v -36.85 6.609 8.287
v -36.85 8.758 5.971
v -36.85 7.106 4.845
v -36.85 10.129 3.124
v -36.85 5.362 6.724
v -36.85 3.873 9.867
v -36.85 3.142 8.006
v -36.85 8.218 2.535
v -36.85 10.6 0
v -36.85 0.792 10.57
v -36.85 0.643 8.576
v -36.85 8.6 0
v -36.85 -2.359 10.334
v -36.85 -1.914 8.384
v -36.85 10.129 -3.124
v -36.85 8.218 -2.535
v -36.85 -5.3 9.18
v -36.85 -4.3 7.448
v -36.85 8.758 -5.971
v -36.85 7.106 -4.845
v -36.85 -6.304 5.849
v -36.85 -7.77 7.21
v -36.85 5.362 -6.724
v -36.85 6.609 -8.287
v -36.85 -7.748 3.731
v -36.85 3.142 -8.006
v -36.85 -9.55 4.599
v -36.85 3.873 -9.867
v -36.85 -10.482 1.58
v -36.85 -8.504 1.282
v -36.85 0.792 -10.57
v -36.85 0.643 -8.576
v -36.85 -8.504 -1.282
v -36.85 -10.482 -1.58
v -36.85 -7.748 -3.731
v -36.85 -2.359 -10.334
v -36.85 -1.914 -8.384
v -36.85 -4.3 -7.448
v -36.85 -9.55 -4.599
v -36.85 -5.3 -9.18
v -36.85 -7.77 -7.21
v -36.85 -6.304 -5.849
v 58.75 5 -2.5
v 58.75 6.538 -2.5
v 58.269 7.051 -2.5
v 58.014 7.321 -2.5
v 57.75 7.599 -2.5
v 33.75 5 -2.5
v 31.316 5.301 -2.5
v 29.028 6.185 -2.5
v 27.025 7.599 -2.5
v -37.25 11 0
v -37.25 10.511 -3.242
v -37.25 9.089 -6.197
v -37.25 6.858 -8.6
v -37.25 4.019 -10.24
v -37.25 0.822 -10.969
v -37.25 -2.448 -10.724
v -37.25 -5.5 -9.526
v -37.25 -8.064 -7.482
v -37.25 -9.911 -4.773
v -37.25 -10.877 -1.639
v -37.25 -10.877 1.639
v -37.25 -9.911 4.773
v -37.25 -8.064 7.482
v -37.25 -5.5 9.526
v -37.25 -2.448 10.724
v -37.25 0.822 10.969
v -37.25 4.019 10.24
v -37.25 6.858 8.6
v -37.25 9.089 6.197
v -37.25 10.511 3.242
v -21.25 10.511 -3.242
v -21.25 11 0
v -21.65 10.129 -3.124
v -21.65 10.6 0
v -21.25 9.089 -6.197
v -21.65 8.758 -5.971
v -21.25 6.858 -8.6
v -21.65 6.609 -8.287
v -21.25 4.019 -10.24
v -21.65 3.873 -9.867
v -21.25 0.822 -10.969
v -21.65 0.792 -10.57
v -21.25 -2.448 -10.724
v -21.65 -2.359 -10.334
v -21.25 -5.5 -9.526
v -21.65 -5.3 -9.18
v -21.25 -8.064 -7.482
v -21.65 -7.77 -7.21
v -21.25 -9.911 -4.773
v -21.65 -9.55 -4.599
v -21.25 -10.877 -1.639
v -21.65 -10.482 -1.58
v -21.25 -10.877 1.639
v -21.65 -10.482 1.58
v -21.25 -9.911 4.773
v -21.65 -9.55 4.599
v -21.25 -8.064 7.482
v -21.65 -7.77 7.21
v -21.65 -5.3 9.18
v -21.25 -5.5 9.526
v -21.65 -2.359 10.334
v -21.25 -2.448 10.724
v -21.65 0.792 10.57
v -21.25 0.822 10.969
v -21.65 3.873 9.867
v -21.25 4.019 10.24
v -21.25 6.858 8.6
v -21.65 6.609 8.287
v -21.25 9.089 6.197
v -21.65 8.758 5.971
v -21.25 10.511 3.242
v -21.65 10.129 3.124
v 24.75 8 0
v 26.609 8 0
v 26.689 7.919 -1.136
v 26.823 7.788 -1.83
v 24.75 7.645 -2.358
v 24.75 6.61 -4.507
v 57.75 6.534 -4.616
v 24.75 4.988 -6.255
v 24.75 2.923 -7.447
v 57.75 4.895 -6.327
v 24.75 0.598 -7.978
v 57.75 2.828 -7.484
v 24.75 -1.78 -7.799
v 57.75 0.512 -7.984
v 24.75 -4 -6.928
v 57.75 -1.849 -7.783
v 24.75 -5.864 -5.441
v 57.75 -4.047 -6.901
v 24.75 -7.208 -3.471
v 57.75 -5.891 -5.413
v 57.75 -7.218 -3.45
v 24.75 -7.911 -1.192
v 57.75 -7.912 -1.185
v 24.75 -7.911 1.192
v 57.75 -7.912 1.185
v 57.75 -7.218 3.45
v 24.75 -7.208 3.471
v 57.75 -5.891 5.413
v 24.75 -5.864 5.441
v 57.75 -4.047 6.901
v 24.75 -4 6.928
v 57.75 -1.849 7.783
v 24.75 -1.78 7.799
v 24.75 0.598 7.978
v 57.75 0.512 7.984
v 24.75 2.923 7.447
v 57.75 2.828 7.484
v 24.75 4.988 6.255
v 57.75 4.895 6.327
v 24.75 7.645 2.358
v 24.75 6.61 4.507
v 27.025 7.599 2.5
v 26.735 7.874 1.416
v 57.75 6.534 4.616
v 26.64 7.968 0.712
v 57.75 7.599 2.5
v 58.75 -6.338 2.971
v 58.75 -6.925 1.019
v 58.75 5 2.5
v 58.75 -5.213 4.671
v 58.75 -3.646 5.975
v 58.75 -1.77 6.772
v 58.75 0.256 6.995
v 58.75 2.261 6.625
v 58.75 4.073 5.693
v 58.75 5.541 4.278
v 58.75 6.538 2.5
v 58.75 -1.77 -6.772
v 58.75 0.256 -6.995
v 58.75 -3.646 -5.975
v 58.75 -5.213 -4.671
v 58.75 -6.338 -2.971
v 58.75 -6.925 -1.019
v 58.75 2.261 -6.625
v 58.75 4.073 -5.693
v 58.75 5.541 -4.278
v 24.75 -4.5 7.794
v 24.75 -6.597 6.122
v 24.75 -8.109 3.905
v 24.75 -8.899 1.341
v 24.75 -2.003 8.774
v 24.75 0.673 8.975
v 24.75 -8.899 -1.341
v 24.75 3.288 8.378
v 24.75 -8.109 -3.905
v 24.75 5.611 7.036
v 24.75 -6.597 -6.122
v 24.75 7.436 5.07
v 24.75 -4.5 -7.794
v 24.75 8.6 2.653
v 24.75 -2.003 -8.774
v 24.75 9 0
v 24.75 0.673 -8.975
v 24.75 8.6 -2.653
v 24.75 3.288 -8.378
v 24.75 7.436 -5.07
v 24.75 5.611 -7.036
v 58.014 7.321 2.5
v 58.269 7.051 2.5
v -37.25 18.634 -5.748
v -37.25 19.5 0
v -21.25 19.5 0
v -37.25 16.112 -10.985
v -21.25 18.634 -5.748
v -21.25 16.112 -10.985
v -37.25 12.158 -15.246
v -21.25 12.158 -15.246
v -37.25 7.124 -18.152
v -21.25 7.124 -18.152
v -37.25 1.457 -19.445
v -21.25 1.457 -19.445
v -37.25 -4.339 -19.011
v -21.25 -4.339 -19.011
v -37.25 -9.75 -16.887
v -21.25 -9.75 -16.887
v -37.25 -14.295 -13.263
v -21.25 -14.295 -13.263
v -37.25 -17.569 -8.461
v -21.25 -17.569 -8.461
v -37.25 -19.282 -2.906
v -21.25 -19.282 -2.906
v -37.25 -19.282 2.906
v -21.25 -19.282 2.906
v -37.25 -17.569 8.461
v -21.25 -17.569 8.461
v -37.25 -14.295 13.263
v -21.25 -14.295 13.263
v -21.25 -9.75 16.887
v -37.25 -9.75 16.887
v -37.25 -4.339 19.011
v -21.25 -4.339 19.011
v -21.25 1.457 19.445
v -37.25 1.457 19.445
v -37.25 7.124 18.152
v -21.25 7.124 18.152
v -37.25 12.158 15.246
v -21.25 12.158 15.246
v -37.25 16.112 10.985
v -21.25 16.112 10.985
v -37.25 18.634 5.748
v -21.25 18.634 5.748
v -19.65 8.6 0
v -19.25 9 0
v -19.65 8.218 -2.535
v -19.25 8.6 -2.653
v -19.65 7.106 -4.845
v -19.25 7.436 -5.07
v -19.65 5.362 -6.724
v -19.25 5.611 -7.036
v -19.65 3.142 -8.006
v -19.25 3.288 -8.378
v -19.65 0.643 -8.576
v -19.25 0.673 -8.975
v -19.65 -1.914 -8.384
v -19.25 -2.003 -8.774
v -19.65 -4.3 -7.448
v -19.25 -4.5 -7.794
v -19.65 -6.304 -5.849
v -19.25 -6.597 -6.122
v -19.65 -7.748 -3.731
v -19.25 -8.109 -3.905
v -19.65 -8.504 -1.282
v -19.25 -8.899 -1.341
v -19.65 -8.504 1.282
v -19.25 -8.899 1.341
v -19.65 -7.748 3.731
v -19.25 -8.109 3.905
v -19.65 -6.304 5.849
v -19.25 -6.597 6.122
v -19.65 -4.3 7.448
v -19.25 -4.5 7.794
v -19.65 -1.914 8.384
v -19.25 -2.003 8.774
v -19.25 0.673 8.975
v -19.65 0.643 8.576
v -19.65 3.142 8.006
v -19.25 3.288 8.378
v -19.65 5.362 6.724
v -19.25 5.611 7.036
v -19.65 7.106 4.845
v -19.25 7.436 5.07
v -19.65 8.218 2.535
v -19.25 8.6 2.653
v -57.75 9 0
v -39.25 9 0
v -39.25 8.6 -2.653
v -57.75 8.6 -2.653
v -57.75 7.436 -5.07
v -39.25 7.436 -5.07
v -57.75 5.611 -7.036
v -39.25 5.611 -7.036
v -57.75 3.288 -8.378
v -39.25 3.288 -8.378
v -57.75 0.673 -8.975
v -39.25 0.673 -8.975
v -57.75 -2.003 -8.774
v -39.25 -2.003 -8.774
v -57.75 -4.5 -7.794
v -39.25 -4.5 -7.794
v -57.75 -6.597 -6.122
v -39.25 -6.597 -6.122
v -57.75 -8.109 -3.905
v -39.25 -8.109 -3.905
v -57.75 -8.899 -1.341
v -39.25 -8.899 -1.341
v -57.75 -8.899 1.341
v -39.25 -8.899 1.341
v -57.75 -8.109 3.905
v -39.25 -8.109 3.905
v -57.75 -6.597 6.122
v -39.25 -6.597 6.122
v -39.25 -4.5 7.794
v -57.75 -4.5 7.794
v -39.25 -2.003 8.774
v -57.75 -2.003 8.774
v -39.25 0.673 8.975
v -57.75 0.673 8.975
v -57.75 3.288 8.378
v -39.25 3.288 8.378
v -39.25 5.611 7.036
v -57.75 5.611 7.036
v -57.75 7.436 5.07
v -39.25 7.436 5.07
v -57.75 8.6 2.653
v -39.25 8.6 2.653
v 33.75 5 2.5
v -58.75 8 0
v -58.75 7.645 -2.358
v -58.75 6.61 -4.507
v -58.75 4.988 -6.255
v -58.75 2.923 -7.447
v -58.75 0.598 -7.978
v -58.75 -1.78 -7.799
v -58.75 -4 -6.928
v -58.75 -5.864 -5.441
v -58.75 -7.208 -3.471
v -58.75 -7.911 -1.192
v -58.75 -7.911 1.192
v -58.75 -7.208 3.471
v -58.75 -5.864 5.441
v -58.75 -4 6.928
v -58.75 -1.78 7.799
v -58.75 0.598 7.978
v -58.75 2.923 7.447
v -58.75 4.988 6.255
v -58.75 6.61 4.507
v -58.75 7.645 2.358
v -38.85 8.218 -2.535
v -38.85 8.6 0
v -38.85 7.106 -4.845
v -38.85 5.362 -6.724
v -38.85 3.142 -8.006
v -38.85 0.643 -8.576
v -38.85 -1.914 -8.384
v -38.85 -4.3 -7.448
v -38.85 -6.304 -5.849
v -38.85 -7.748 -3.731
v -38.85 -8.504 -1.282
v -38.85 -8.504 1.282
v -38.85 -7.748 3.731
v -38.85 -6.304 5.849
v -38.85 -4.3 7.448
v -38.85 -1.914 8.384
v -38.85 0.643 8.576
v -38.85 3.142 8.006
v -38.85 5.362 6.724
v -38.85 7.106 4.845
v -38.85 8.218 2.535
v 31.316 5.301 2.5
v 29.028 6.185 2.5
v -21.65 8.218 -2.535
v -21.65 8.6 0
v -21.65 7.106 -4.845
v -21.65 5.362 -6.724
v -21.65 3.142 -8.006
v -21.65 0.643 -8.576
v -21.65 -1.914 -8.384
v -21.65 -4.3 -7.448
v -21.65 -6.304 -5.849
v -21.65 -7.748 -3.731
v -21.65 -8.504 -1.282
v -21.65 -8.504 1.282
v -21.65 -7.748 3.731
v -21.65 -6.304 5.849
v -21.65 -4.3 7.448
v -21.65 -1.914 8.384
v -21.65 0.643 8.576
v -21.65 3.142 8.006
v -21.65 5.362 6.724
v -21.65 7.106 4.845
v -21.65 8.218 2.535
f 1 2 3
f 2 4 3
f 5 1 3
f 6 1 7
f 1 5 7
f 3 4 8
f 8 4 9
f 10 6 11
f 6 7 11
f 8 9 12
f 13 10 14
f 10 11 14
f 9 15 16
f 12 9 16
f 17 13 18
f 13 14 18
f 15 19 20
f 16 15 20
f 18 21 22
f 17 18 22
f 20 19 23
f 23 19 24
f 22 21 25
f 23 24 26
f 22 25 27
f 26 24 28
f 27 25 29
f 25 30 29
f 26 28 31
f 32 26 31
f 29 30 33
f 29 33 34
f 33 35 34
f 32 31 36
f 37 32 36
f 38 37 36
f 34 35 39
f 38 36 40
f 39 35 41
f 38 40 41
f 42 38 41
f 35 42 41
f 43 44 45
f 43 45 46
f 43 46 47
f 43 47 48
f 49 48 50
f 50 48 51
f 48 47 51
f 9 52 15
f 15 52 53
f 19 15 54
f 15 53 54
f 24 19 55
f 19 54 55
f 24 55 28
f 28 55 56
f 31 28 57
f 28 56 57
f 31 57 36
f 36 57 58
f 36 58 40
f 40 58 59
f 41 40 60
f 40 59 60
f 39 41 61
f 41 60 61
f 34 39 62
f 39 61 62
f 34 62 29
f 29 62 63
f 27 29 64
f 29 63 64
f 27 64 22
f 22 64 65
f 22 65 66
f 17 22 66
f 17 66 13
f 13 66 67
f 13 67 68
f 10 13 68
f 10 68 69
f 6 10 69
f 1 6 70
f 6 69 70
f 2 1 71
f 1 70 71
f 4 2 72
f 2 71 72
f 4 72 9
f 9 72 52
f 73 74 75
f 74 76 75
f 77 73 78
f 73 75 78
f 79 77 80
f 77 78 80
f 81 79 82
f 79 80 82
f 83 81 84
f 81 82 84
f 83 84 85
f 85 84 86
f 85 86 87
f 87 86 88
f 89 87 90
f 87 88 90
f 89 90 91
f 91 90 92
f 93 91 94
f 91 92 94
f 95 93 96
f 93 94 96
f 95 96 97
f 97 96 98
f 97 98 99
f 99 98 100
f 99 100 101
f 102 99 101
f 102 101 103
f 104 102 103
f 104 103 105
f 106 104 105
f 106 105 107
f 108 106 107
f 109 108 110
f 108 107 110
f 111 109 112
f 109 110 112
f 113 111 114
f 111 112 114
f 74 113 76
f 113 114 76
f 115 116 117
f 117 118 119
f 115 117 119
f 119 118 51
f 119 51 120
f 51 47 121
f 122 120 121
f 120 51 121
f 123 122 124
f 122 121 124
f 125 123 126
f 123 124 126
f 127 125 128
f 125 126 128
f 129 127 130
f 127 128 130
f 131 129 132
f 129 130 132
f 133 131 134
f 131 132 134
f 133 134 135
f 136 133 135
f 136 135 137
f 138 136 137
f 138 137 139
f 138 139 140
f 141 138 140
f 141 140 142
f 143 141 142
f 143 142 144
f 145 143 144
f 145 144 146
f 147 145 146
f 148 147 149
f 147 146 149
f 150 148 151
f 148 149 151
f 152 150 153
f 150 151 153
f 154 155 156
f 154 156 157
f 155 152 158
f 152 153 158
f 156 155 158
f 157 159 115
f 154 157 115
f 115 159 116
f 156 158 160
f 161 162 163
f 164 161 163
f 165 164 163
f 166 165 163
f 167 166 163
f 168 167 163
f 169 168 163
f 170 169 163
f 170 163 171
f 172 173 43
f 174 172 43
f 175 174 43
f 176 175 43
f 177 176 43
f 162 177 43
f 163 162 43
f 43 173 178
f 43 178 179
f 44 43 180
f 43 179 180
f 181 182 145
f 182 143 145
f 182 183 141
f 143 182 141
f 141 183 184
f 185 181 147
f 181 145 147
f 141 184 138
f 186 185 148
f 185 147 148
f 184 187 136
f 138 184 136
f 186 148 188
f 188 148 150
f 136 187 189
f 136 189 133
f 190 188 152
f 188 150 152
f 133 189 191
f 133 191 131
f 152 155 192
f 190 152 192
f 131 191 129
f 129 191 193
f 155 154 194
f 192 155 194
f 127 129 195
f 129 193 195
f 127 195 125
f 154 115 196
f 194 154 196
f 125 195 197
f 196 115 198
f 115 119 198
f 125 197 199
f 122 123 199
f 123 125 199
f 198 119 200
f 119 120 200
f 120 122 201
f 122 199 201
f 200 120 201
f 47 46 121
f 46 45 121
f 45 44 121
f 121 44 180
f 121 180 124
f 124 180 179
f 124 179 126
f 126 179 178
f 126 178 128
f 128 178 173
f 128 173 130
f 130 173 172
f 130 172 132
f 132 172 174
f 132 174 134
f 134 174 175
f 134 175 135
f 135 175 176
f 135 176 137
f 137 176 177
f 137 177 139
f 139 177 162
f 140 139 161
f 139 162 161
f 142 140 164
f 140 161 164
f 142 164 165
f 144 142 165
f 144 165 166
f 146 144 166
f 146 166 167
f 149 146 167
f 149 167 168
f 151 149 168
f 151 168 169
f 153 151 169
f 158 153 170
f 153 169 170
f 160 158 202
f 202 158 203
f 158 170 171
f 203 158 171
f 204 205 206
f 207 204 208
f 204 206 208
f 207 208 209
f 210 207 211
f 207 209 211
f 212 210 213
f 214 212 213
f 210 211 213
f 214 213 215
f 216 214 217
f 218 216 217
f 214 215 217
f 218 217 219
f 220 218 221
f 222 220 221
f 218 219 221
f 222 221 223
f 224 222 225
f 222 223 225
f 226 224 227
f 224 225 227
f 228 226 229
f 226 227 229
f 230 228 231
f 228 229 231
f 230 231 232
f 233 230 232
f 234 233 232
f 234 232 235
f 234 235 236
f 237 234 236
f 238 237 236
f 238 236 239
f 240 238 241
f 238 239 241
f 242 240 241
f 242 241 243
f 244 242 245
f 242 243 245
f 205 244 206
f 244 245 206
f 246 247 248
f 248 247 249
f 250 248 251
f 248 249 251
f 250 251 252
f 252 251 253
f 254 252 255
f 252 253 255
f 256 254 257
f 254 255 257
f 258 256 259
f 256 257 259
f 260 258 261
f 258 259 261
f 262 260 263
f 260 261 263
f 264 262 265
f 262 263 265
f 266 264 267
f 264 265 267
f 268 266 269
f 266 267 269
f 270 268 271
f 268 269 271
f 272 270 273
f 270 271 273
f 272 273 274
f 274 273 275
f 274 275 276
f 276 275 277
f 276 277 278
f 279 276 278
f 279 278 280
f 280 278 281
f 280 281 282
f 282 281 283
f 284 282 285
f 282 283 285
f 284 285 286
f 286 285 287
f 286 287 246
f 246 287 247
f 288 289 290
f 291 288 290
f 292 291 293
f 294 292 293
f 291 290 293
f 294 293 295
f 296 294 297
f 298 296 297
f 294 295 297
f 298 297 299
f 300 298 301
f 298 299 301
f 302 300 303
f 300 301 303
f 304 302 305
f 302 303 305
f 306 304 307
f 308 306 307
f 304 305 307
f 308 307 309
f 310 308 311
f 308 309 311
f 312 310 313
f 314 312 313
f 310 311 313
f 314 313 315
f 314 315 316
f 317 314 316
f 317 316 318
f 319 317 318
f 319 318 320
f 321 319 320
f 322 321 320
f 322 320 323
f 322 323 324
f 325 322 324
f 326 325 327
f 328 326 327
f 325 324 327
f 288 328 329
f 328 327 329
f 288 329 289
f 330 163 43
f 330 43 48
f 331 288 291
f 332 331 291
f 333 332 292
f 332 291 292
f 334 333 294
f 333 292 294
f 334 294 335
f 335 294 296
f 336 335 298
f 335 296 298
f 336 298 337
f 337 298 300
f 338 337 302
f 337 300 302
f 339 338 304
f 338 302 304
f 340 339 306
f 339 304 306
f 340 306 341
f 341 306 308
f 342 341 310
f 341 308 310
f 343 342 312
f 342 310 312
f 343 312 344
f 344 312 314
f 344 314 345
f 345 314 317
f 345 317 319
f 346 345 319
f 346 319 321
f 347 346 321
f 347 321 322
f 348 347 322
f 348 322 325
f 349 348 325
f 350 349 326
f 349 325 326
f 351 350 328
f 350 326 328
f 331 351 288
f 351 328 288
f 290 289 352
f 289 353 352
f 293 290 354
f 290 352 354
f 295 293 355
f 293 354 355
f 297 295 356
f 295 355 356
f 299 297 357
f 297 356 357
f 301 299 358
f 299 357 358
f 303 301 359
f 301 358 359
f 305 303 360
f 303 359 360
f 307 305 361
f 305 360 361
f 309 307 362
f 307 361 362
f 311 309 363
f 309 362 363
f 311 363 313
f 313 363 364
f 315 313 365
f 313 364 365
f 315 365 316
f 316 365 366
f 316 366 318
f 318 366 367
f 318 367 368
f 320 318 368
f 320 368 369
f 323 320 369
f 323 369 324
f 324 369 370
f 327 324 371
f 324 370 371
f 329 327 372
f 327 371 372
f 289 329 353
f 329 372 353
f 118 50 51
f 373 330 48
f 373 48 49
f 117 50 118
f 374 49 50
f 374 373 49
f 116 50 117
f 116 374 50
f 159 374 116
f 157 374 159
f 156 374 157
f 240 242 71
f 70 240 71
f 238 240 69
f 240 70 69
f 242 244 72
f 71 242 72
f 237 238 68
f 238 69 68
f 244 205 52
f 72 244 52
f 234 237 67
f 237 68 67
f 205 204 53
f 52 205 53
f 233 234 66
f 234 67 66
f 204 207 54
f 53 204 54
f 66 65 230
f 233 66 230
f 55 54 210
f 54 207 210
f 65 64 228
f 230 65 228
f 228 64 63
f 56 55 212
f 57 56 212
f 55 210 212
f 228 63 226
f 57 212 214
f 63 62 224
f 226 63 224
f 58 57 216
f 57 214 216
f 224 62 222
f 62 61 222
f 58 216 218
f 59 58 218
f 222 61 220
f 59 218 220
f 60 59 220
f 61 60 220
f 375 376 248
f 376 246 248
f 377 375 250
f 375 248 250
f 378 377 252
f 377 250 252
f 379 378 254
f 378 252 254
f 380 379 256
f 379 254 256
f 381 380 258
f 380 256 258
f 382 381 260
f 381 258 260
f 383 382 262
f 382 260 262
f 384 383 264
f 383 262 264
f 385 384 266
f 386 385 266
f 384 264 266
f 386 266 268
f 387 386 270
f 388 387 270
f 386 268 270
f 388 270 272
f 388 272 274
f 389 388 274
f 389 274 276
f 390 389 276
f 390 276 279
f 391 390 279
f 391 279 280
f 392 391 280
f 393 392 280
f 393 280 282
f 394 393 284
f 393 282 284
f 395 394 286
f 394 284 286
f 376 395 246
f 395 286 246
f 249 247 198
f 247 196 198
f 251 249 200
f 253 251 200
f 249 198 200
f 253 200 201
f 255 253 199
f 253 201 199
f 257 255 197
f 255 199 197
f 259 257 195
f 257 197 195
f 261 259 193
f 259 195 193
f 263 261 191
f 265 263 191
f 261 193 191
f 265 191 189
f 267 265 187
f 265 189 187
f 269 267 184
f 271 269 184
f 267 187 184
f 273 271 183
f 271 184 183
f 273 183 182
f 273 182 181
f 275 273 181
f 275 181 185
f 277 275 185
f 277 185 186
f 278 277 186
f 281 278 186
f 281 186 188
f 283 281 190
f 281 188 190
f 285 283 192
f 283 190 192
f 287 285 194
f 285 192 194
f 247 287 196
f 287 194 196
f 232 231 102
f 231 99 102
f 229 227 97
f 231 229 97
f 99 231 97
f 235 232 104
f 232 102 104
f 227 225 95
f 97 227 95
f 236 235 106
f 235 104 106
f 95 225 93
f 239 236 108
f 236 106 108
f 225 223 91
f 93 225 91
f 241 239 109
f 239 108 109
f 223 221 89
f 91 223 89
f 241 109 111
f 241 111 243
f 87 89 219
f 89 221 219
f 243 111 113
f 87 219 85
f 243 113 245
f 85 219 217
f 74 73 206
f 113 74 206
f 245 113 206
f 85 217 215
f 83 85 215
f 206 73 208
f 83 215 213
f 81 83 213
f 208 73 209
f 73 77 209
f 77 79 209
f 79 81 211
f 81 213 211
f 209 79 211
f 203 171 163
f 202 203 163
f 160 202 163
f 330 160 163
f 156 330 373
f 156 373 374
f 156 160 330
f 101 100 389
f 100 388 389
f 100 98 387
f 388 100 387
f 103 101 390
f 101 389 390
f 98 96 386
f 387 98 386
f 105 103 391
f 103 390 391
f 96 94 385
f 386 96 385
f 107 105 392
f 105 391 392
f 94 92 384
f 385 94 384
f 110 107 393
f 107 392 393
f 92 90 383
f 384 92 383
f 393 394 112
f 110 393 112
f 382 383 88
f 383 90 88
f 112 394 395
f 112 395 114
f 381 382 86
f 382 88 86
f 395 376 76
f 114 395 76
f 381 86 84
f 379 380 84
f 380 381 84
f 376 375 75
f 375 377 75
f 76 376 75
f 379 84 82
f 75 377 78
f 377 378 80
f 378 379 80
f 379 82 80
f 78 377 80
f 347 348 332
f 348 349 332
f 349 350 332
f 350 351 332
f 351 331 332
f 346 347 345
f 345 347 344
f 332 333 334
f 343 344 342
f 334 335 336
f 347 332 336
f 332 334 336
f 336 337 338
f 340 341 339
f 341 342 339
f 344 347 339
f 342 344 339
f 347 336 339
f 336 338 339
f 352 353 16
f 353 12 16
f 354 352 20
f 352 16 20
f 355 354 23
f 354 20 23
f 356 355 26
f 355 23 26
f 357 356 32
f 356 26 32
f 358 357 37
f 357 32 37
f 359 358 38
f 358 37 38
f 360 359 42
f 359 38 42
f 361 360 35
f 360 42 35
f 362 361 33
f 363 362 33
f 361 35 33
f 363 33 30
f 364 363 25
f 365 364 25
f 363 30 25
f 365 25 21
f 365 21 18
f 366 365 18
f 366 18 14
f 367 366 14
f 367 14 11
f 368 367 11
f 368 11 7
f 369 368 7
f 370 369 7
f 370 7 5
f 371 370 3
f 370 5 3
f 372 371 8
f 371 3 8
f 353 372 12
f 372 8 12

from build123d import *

# Parameters (mm, degrees)
CHAMFER_1_SIZE      = 1
CUT_EXTRUDE_1_DEPTH = 2.5
CHAMFER_2_SIZE      = 1


with BuildPart() as part:
    # 草图1 → 旋转1 (revolve)
    with BuildSketch(Plane.XY):
        Polygon((-58.75, 0), (-58.75, 9), (-39.25, 9), (-38.85, 8.6), (-36.85, 8.6), (-36.85, 10.6), (-37.25, 11), (-37.25, 19.5), (-21.25, 19.5), (-21.25, 11), (-21.65, 10.6), (-21.65, 8.6), (-19.65, 8.6), (-19.25, 9), (24.75, 9), (24.75, 8), (58.75, 8), (58.75, 0), align=None)
    revolve(axis=Axis((58.75, 0, 0), (-1, 0, 0)))

    # 倒角1
    chamfer_1_edges = [part.edges().sort_by_distance(p)[0] for p in [
        (-58.75, -9, 0),
    ]]
    chamfer(chamfer_1_edges, length=CHAMFER_1_SIZE)

    # 草图3 → 切除-拉伸1 (cut, symmetric)
    with BuildSketch(Plane.XY):
        with BuildLine():
            Line((58.75, 5), (33.75, 5))
            ThreePointArc((33.75, 5), (29.877016654, 5.780455543), (26.608571571, 8))
            Line((26.608571571, 8), (26.608571571, 13))
            Line((26.608571571, 13), (58.75, 13))
            Line((58.75, 13), (58.75, 5))
        make_face()
    extrude(amount=CUT_EXTRUDE_1_DEPTH, both=True, mode=Mode.SUBTRACT)

    # 倒角2
    chamfer_2_edges = [part.edges().sort_by_distance(p)[0] for p in [
        (58.75, -8, 0),
    ]]
    chamfer(chamfer_2_edges, length=CHAMFER_2_SIZE)


solid = part.part
